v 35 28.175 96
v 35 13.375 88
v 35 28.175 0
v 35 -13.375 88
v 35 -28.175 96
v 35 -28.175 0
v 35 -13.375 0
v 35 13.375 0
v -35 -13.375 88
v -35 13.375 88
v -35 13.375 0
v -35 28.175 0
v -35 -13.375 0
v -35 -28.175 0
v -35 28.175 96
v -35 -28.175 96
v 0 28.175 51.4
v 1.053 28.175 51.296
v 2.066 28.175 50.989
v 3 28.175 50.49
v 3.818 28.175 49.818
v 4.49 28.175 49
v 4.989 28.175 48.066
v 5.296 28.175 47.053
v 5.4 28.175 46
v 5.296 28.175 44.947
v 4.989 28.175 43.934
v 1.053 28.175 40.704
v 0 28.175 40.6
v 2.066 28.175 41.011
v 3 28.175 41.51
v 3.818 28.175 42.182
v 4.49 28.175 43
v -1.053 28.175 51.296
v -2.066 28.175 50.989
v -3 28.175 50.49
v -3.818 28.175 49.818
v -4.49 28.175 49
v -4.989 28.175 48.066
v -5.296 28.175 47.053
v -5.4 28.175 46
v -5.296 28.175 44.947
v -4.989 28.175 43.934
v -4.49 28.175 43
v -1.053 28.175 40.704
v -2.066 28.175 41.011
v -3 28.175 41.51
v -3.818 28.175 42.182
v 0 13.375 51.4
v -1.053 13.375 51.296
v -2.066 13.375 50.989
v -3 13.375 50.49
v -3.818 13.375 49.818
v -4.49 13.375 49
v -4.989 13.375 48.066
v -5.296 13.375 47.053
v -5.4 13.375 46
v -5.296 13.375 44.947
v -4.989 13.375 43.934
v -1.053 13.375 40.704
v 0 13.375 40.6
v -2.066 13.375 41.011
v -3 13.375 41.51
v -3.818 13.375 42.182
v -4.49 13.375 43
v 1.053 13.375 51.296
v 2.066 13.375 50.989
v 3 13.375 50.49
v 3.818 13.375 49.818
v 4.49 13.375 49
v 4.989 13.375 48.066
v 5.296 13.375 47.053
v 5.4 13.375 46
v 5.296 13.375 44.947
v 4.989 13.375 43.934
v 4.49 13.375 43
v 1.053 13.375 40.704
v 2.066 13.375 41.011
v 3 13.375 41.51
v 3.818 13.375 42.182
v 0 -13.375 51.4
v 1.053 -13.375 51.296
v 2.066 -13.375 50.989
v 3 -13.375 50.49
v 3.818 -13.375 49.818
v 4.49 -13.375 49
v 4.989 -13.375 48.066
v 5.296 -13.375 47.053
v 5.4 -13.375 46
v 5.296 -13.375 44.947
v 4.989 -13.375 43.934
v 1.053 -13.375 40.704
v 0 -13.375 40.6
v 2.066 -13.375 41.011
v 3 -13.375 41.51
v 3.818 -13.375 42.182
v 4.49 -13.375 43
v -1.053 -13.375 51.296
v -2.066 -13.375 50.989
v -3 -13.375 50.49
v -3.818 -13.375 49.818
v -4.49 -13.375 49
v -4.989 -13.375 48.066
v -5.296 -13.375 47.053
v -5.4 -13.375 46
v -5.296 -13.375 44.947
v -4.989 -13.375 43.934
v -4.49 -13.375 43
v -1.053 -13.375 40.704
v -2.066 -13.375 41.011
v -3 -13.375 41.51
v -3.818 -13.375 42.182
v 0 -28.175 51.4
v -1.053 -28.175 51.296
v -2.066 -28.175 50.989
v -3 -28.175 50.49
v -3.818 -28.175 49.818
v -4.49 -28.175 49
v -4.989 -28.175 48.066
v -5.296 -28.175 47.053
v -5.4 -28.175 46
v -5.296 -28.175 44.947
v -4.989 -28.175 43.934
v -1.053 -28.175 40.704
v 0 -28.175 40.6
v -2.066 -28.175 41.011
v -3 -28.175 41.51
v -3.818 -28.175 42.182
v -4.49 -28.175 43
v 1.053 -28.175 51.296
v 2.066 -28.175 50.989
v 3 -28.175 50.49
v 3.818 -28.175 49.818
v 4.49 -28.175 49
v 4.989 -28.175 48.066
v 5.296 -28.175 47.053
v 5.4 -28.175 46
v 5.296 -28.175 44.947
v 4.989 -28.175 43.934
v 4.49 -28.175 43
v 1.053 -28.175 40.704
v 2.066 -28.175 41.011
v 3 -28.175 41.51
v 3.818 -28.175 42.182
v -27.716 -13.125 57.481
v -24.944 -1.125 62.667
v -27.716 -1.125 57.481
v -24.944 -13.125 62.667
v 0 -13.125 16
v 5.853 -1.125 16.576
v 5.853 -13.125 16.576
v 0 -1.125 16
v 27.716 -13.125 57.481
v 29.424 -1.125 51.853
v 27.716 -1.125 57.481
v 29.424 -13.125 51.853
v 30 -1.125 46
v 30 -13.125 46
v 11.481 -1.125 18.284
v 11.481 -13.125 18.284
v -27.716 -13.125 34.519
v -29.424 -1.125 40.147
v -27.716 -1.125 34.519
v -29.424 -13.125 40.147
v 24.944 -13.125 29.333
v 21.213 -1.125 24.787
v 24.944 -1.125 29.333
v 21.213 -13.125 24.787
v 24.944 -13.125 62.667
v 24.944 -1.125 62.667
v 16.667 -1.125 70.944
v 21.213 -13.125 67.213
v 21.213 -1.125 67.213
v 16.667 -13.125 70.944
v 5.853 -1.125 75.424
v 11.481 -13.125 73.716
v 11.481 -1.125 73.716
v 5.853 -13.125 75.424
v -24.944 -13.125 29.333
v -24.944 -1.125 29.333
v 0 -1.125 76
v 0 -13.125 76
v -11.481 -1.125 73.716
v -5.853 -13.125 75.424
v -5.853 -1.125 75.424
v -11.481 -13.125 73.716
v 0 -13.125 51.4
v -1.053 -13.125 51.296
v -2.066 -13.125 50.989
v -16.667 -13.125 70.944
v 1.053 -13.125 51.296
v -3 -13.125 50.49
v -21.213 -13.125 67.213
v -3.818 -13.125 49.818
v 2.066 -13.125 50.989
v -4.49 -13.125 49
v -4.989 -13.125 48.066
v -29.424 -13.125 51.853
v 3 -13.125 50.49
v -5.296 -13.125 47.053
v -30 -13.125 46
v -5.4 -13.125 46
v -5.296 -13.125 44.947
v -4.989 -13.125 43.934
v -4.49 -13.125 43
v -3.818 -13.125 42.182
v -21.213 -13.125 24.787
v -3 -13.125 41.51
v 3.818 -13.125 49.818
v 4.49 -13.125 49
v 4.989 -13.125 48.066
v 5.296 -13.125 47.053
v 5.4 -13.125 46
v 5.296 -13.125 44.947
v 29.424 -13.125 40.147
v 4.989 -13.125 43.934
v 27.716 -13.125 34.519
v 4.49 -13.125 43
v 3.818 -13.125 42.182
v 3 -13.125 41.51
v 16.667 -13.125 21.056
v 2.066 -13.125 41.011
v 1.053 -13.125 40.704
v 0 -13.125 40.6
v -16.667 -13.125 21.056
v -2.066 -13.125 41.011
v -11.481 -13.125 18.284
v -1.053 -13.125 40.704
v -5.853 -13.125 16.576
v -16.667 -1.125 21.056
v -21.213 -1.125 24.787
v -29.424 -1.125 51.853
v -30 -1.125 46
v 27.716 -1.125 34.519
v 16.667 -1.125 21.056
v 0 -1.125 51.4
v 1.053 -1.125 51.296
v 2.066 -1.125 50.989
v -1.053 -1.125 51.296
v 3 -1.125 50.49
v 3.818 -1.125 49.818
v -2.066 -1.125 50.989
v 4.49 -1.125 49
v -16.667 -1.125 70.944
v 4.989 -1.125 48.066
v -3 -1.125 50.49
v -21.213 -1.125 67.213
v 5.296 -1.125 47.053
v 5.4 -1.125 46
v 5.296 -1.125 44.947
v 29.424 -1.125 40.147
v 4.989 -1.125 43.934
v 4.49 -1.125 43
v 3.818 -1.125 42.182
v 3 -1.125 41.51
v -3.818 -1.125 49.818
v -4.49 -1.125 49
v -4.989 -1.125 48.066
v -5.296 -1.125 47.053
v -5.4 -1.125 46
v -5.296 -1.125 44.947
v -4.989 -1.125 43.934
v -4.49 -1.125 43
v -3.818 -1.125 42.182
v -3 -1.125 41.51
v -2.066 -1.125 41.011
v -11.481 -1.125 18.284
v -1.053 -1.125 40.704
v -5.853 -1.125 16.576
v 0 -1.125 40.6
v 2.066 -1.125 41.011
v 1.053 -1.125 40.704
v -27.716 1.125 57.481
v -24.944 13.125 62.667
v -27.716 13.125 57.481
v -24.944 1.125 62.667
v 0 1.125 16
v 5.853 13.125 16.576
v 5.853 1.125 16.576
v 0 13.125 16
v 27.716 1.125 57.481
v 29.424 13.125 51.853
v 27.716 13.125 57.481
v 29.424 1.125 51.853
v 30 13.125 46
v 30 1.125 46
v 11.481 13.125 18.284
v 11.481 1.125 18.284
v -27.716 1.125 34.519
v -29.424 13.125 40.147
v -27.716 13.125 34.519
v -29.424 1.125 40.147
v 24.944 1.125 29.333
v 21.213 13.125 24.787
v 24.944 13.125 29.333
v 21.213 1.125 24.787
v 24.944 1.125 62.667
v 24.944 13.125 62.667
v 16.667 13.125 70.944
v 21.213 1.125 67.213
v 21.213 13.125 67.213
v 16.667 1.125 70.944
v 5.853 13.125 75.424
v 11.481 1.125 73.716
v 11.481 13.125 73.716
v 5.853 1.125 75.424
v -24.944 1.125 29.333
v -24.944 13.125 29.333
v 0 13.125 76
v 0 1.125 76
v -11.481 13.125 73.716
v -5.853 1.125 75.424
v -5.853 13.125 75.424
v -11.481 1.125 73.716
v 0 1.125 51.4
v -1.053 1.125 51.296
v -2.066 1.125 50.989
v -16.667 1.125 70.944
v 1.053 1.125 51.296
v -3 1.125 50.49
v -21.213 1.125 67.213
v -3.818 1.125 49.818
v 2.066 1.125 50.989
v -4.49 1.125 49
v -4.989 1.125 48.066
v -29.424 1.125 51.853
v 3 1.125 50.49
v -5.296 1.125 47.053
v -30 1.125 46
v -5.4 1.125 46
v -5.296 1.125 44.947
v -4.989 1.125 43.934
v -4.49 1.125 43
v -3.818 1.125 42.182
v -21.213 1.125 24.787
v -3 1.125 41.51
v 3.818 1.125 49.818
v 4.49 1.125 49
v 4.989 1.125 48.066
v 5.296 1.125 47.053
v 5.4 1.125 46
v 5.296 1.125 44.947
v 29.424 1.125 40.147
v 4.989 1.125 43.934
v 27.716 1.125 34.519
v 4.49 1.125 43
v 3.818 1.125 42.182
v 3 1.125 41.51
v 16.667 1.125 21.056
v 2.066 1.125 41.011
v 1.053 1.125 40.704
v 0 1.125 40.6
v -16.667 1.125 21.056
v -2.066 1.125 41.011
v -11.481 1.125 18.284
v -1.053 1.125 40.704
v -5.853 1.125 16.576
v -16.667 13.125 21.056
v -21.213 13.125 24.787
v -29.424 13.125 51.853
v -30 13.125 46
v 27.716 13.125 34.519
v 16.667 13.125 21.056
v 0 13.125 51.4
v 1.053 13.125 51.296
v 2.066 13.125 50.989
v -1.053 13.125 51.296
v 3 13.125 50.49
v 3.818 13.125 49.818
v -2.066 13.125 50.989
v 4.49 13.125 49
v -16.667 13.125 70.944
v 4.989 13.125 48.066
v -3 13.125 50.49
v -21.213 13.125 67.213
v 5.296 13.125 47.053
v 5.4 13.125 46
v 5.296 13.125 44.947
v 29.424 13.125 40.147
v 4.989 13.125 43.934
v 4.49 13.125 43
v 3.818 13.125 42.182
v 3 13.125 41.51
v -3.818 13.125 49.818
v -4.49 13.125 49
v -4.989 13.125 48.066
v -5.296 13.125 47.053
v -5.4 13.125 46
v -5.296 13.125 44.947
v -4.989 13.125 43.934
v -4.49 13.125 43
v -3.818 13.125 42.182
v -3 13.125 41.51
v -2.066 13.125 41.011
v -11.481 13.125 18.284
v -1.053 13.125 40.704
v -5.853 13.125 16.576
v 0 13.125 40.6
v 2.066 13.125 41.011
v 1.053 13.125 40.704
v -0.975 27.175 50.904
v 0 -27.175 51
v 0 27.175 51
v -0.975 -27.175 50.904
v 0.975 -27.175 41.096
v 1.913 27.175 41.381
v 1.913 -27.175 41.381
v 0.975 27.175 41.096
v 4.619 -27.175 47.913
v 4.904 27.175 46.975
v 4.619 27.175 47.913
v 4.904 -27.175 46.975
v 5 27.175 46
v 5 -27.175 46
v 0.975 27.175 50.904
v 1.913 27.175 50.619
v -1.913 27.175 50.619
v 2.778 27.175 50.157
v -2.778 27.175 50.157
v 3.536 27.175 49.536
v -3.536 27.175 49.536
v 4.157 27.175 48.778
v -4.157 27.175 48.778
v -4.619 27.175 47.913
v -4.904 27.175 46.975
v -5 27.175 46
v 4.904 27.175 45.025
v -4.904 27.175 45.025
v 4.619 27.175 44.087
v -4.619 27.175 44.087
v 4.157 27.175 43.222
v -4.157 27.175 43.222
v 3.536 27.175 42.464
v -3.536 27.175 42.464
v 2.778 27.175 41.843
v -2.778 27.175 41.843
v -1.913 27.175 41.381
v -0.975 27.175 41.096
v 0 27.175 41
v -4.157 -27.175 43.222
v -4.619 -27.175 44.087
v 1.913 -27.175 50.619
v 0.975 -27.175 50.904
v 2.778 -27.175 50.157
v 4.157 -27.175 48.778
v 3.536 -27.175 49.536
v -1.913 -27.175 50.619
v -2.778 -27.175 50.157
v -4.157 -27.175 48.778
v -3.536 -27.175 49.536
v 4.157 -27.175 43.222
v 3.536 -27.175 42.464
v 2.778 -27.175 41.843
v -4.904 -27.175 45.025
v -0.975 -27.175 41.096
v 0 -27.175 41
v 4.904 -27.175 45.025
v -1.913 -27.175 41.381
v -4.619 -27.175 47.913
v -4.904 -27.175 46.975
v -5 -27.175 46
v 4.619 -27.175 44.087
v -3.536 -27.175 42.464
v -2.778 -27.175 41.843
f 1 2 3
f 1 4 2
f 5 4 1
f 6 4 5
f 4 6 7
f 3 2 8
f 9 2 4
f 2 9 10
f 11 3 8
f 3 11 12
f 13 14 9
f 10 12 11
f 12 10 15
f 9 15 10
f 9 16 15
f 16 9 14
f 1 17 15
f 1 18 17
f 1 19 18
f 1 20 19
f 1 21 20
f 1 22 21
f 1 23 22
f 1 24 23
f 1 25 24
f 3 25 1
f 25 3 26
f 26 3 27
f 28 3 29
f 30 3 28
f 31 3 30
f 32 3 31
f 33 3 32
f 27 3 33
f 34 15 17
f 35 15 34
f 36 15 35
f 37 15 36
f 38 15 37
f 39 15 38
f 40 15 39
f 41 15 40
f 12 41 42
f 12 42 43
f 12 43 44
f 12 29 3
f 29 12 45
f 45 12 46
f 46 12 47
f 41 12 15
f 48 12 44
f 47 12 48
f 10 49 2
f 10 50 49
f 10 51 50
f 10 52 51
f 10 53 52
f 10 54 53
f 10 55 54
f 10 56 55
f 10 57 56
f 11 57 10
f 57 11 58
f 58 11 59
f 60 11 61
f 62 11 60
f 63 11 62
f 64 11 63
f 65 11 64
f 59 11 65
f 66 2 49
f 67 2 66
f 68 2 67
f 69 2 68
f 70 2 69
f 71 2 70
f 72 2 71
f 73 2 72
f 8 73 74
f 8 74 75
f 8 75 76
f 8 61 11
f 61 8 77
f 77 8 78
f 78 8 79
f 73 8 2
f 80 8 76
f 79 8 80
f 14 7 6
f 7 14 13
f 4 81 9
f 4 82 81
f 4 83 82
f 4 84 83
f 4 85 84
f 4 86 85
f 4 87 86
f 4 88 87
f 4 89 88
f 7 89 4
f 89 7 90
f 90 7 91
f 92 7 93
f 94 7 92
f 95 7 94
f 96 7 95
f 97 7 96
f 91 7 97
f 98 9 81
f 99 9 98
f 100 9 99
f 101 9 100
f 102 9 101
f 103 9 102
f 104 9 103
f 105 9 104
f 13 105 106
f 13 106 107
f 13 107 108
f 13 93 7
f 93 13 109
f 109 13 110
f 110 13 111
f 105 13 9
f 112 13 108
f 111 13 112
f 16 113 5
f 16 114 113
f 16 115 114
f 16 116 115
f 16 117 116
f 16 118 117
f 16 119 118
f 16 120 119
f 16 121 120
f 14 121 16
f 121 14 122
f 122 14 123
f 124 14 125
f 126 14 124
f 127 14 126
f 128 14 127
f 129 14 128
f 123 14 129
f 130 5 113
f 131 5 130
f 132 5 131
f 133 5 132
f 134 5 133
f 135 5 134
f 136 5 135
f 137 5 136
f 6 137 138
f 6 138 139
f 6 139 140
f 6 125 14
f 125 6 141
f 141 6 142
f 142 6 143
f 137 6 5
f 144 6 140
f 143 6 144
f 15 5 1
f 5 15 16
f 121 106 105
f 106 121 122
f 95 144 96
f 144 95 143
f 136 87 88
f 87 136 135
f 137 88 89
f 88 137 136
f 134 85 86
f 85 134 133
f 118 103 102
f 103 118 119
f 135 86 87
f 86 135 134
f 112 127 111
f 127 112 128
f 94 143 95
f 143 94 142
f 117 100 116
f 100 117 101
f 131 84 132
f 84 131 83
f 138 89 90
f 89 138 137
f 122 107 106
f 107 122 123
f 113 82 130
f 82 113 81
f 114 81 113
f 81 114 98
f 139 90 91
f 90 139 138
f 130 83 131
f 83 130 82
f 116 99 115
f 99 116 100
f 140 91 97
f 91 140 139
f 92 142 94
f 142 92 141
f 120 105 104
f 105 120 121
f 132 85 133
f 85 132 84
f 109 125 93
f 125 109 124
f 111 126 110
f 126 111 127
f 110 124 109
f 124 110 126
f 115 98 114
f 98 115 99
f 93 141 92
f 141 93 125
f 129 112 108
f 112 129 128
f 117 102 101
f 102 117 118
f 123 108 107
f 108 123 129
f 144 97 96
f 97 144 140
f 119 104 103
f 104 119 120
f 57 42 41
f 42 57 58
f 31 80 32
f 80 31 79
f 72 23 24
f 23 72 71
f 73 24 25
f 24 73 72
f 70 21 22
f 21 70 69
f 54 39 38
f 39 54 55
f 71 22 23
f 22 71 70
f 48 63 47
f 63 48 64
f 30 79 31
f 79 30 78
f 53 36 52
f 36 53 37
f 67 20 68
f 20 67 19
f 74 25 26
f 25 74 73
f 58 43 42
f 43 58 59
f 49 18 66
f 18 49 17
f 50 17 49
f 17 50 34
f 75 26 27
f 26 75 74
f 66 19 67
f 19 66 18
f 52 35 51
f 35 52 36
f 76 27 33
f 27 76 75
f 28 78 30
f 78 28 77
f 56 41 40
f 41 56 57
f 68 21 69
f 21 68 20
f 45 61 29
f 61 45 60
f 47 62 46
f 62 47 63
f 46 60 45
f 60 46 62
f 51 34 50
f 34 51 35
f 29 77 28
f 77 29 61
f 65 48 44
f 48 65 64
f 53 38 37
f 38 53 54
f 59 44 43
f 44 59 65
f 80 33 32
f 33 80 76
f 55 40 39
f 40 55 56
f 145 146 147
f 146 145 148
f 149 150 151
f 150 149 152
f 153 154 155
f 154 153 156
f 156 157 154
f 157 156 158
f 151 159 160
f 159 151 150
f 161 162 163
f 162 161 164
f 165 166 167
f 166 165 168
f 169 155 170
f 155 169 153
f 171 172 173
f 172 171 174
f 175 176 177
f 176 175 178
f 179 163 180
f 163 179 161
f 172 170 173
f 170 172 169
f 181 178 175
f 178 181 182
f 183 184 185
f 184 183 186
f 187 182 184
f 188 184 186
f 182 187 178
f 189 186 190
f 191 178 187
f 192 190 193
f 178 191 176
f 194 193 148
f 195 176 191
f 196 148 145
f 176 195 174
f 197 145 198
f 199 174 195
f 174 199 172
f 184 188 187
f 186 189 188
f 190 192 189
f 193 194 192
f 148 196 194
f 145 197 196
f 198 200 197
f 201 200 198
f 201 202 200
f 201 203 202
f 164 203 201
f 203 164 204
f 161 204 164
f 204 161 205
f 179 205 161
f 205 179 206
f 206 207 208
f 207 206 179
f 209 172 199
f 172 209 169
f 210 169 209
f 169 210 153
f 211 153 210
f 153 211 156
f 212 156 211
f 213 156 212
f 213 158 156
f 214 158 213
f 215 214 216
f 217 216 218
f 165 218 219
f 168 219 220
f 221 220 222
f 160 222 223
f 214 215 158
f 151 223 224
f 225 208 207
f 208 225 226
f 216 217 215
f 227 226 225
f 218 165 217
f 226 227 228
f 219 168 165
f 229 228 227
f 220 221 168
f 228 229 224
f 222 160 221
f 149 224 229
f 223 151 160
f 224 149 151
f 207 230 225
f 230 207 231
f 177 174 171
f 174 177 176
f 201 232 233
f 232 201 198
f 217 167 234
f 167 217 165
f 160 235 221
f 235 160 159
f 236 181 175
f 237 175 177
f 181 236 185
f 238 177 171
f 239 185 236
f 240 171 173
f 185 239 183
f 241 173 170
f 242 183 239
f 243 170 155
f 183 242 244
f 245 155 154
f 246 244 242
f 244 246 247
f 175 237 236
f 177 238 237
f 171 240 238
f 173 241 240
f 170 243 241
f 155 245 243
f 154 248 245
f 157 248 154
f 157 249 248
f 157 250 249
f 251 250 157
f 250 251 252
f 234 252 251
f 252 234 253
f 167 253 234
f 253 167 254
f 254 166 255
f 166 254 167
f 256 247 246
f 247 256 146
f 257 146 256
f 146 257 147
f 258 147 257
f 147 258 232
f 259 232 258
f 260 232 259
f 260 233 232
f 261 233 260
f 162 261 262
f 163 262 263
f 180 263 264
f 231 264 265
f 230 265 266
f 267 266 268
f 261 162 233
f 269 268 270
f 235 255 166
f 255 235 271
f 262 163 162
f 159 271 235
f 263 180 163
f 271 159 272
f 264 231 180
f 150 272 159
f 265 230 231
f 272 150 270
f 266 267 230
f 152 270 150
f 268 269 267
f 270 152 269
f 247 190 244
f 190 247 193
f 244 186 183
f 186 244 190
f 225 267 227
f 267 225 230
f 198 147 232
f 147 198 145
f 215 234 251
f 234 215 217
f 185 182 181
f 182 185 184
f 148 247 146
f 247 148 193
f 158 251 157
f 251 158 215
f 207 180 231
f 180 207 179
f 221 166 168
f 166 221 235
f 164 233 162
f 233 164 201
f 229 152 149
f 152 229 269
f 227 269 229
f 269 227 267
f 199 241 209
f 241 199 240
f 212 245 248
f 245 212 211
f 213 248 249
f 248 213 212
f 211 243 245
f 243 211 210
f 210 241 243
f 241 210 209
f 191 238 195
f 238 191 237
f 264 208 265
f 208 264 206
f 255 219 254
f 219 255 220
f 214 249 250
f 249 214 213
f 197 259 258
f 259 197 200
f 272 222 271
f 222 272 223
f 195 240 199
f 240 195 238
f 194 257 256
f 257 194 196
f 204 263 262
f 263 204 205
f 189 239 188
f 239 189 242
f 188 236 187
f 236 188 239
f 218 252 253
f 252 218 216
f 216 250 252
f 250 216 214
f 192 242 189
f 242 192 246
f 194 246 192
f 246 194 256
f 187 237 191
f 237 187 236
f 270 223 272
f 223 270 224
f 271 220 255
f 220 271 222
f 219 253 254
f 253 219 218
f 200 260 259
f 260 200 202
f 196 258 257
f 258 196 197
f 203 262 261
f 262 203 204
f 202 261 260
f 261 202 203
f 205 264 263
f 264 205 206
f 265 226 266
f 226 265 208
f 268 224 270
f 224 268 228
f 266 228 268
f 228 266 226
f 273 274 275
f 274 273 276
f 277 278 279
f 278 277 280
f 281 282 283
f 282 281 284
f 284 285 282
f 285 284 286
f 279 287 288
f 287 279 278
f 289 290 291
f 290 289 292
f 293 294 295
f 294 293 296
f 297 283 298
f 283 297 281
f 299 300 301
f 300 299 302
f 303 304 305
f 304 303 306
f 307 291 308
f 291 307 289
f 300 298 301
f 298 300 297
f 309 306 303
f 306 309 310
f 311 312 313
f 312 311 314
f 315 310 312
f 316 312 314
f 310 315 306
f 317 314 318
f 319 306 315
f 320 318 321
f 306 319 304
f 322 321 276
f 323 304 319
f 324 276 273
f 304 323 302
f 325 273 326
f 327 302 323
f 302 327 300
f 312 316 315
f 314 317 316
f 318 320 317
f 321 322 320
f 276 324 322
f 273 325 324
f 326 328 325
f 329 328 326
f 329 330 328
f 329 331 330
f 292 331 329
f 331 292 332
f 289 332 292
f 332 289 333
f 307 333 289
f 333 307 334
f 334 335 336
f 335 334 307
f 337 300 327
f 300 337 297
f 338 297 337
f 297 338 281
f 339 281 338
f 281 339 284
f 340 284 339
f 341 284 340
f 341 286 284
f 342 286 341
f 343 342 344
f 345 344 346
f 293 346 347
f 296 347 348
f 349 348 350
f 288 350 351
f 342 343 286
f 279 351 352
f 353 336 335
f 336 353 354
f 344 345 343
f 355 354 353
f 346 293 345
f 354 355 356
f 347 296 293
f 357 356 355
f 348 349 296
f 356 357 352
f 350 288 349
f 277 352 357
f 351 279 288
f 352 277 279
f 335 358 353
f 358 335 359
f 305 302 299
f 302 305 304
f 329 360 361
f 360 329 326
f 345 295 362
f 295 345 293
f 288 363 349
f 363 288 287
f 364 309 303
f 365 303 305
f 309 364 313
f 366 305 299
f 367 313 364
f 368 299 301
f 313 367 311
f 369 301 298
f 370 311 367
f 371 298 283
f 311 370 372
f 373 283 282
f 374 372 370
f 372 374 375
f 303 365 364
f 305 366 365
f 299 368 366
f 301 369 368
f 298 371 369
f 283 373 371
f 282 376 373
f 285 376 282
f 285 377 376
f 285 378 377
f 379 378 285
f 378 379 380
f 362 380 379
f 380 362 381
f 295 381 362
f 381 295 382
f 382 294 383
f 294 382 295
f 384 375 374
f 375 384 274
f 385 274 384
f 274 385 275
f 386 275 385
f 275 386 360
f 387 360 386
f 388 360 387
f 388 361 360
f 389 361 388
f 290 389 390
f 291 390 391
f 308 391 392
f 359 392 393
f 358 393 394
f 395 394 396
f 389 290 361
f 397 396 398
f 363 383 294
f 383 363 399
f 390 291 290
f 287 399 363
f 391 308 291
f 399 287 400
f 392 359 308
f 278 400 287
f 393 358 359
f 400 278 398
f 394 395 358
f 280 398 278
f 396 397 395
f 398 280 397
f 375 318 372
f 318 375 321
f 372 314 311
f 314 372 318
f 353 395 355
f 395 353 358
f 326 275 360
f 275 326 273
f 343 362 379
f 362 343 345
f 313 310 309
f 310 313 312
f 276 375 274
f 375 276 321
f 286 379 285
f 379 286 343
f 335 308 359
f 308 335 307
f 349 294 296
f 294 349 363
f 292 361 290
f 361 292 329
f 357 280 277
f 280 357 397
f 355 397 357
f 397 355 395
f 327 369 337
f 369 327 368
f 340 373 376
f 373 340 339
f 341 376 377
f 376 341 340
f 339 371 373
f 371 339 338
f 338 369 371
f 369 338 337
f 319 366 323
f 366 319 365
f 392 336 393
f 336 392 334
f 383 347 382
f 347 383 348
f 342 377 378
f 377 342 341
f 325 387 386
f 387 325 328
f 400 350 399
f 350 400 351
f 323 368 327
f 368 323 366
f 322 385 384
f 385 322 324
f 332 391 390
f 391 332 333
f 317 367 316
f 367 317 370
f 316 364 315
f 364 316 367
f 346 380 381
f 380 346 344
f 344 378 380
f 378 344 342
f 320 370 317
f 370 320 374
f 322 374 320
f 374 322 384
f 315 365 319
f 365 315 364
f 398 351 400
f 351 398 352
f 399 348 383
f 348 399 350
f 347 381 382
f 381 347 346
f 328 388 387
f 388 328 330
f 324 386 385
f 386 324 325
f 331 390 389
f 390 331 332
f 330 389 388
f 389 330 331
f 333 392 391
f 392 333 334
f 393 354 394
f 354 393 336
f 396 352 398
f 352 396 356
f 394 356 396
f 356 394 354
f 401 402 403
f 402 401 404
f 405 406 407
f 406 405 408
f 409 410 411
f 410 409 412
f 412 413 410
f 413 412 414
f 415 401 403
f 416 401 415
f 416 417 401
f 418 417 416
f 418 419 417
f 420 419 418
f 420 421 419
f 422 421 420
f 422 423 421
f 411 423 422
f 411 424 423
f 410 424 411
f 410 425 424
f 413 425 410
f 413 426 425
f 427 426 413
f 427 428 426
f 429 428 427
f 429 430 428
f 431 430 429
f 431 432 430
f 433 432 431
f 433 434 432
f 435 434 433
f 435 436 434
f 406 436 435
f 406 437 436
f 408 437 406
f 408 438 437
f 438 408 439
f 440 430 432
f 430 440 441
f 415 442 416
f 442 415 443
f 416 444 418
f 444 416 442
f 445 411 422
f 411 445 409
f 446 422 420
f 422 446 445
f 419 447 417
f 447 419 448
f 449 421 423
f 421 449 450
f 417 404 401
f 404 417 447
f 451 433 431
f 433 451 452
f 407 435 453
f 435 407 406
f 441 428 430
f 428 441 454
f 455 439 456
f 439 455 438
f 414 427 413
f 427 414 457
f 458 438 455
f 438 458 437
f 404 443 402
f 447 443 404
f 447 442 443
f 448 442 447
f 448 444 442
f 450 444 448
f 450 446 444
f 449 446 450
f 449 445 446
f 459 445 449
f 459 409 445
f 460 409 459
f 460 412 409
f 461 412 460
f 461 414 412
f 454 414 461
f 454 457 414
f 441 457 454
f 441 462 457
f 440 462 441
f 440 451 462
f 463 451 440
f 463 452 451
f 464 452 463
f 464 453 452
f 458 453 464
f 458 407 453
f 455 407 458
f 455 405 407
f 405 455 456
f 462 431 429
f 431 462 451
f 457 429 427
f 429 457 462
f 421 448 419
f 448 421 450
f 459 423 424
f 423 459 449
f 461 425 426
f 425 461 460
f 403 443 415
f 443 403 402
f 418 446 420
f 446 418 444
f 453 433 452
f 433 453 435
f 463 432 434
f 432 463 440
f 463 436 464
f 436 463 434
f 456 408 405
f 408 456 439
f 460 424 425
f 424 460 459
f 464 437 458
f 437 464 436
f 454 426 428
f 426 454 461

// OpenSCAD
$fn = 32;

// ------------------------------------------------------------------------
// Trolley wheel set: wheels d60, fork 88 mm tall
// Every part is its own module, assembly() places every instance.
// ------------------------------------------------------------------------

// --- part 1 ---
module trolley_fork() {
  difference() {
    union() {
      translate([-35, 13.375, 0]) cube([70, 14.8, 88]);
      translate([-35, -28.175, 0]) cube([70, 14.8, 88]);
      translate([-35, -28.175, 88]) cube([70, 56.35, 8]);
    }
    translate([0, -20.775, 46]) rotate([90, 0, 0]) cylinder(h = 16.8, d = 10.8, center = true);
    translate([0, 20.775, 46]) rotate([90, 0, 0]) cylinder(h = 16.8, d = 10.8, center = true);
  }
}

// --- part 2 ---
module trolley_wheel() {
  difference() {
      translate([0, 0, 0]) cylinder(h = 12, d = 60);
      translate([0, 0, -1]) cylinder(h = 14, d = 10.8);
    }
}

// --- part 3 ---
module trolley_axle() {
  translate([0, 0, -27.175]) cylinder(h = 54.35, d = 10);
}

// --- assembly ---
module assembly() {
  color([0.80, 0.24, 0.20]) translate([0, 0, 0]) rotate([0, 0, 0]) trolley_fork();
  color([0.20, 0.45, 0.75]) translate([0, -1.125, 46]) rotate([90, 0, 0]) trolley_wheel();
  color([0.25, 0.62, 0.32]) translate([0, 13.125, 46]) rotate([90, 0, 0]) trolley_wheel();
  color([0.92, 0.70, 0.18]) translate([0, 0, 46]) rotate([90, 0, 0]) trolley_axle();
}

assembly();
